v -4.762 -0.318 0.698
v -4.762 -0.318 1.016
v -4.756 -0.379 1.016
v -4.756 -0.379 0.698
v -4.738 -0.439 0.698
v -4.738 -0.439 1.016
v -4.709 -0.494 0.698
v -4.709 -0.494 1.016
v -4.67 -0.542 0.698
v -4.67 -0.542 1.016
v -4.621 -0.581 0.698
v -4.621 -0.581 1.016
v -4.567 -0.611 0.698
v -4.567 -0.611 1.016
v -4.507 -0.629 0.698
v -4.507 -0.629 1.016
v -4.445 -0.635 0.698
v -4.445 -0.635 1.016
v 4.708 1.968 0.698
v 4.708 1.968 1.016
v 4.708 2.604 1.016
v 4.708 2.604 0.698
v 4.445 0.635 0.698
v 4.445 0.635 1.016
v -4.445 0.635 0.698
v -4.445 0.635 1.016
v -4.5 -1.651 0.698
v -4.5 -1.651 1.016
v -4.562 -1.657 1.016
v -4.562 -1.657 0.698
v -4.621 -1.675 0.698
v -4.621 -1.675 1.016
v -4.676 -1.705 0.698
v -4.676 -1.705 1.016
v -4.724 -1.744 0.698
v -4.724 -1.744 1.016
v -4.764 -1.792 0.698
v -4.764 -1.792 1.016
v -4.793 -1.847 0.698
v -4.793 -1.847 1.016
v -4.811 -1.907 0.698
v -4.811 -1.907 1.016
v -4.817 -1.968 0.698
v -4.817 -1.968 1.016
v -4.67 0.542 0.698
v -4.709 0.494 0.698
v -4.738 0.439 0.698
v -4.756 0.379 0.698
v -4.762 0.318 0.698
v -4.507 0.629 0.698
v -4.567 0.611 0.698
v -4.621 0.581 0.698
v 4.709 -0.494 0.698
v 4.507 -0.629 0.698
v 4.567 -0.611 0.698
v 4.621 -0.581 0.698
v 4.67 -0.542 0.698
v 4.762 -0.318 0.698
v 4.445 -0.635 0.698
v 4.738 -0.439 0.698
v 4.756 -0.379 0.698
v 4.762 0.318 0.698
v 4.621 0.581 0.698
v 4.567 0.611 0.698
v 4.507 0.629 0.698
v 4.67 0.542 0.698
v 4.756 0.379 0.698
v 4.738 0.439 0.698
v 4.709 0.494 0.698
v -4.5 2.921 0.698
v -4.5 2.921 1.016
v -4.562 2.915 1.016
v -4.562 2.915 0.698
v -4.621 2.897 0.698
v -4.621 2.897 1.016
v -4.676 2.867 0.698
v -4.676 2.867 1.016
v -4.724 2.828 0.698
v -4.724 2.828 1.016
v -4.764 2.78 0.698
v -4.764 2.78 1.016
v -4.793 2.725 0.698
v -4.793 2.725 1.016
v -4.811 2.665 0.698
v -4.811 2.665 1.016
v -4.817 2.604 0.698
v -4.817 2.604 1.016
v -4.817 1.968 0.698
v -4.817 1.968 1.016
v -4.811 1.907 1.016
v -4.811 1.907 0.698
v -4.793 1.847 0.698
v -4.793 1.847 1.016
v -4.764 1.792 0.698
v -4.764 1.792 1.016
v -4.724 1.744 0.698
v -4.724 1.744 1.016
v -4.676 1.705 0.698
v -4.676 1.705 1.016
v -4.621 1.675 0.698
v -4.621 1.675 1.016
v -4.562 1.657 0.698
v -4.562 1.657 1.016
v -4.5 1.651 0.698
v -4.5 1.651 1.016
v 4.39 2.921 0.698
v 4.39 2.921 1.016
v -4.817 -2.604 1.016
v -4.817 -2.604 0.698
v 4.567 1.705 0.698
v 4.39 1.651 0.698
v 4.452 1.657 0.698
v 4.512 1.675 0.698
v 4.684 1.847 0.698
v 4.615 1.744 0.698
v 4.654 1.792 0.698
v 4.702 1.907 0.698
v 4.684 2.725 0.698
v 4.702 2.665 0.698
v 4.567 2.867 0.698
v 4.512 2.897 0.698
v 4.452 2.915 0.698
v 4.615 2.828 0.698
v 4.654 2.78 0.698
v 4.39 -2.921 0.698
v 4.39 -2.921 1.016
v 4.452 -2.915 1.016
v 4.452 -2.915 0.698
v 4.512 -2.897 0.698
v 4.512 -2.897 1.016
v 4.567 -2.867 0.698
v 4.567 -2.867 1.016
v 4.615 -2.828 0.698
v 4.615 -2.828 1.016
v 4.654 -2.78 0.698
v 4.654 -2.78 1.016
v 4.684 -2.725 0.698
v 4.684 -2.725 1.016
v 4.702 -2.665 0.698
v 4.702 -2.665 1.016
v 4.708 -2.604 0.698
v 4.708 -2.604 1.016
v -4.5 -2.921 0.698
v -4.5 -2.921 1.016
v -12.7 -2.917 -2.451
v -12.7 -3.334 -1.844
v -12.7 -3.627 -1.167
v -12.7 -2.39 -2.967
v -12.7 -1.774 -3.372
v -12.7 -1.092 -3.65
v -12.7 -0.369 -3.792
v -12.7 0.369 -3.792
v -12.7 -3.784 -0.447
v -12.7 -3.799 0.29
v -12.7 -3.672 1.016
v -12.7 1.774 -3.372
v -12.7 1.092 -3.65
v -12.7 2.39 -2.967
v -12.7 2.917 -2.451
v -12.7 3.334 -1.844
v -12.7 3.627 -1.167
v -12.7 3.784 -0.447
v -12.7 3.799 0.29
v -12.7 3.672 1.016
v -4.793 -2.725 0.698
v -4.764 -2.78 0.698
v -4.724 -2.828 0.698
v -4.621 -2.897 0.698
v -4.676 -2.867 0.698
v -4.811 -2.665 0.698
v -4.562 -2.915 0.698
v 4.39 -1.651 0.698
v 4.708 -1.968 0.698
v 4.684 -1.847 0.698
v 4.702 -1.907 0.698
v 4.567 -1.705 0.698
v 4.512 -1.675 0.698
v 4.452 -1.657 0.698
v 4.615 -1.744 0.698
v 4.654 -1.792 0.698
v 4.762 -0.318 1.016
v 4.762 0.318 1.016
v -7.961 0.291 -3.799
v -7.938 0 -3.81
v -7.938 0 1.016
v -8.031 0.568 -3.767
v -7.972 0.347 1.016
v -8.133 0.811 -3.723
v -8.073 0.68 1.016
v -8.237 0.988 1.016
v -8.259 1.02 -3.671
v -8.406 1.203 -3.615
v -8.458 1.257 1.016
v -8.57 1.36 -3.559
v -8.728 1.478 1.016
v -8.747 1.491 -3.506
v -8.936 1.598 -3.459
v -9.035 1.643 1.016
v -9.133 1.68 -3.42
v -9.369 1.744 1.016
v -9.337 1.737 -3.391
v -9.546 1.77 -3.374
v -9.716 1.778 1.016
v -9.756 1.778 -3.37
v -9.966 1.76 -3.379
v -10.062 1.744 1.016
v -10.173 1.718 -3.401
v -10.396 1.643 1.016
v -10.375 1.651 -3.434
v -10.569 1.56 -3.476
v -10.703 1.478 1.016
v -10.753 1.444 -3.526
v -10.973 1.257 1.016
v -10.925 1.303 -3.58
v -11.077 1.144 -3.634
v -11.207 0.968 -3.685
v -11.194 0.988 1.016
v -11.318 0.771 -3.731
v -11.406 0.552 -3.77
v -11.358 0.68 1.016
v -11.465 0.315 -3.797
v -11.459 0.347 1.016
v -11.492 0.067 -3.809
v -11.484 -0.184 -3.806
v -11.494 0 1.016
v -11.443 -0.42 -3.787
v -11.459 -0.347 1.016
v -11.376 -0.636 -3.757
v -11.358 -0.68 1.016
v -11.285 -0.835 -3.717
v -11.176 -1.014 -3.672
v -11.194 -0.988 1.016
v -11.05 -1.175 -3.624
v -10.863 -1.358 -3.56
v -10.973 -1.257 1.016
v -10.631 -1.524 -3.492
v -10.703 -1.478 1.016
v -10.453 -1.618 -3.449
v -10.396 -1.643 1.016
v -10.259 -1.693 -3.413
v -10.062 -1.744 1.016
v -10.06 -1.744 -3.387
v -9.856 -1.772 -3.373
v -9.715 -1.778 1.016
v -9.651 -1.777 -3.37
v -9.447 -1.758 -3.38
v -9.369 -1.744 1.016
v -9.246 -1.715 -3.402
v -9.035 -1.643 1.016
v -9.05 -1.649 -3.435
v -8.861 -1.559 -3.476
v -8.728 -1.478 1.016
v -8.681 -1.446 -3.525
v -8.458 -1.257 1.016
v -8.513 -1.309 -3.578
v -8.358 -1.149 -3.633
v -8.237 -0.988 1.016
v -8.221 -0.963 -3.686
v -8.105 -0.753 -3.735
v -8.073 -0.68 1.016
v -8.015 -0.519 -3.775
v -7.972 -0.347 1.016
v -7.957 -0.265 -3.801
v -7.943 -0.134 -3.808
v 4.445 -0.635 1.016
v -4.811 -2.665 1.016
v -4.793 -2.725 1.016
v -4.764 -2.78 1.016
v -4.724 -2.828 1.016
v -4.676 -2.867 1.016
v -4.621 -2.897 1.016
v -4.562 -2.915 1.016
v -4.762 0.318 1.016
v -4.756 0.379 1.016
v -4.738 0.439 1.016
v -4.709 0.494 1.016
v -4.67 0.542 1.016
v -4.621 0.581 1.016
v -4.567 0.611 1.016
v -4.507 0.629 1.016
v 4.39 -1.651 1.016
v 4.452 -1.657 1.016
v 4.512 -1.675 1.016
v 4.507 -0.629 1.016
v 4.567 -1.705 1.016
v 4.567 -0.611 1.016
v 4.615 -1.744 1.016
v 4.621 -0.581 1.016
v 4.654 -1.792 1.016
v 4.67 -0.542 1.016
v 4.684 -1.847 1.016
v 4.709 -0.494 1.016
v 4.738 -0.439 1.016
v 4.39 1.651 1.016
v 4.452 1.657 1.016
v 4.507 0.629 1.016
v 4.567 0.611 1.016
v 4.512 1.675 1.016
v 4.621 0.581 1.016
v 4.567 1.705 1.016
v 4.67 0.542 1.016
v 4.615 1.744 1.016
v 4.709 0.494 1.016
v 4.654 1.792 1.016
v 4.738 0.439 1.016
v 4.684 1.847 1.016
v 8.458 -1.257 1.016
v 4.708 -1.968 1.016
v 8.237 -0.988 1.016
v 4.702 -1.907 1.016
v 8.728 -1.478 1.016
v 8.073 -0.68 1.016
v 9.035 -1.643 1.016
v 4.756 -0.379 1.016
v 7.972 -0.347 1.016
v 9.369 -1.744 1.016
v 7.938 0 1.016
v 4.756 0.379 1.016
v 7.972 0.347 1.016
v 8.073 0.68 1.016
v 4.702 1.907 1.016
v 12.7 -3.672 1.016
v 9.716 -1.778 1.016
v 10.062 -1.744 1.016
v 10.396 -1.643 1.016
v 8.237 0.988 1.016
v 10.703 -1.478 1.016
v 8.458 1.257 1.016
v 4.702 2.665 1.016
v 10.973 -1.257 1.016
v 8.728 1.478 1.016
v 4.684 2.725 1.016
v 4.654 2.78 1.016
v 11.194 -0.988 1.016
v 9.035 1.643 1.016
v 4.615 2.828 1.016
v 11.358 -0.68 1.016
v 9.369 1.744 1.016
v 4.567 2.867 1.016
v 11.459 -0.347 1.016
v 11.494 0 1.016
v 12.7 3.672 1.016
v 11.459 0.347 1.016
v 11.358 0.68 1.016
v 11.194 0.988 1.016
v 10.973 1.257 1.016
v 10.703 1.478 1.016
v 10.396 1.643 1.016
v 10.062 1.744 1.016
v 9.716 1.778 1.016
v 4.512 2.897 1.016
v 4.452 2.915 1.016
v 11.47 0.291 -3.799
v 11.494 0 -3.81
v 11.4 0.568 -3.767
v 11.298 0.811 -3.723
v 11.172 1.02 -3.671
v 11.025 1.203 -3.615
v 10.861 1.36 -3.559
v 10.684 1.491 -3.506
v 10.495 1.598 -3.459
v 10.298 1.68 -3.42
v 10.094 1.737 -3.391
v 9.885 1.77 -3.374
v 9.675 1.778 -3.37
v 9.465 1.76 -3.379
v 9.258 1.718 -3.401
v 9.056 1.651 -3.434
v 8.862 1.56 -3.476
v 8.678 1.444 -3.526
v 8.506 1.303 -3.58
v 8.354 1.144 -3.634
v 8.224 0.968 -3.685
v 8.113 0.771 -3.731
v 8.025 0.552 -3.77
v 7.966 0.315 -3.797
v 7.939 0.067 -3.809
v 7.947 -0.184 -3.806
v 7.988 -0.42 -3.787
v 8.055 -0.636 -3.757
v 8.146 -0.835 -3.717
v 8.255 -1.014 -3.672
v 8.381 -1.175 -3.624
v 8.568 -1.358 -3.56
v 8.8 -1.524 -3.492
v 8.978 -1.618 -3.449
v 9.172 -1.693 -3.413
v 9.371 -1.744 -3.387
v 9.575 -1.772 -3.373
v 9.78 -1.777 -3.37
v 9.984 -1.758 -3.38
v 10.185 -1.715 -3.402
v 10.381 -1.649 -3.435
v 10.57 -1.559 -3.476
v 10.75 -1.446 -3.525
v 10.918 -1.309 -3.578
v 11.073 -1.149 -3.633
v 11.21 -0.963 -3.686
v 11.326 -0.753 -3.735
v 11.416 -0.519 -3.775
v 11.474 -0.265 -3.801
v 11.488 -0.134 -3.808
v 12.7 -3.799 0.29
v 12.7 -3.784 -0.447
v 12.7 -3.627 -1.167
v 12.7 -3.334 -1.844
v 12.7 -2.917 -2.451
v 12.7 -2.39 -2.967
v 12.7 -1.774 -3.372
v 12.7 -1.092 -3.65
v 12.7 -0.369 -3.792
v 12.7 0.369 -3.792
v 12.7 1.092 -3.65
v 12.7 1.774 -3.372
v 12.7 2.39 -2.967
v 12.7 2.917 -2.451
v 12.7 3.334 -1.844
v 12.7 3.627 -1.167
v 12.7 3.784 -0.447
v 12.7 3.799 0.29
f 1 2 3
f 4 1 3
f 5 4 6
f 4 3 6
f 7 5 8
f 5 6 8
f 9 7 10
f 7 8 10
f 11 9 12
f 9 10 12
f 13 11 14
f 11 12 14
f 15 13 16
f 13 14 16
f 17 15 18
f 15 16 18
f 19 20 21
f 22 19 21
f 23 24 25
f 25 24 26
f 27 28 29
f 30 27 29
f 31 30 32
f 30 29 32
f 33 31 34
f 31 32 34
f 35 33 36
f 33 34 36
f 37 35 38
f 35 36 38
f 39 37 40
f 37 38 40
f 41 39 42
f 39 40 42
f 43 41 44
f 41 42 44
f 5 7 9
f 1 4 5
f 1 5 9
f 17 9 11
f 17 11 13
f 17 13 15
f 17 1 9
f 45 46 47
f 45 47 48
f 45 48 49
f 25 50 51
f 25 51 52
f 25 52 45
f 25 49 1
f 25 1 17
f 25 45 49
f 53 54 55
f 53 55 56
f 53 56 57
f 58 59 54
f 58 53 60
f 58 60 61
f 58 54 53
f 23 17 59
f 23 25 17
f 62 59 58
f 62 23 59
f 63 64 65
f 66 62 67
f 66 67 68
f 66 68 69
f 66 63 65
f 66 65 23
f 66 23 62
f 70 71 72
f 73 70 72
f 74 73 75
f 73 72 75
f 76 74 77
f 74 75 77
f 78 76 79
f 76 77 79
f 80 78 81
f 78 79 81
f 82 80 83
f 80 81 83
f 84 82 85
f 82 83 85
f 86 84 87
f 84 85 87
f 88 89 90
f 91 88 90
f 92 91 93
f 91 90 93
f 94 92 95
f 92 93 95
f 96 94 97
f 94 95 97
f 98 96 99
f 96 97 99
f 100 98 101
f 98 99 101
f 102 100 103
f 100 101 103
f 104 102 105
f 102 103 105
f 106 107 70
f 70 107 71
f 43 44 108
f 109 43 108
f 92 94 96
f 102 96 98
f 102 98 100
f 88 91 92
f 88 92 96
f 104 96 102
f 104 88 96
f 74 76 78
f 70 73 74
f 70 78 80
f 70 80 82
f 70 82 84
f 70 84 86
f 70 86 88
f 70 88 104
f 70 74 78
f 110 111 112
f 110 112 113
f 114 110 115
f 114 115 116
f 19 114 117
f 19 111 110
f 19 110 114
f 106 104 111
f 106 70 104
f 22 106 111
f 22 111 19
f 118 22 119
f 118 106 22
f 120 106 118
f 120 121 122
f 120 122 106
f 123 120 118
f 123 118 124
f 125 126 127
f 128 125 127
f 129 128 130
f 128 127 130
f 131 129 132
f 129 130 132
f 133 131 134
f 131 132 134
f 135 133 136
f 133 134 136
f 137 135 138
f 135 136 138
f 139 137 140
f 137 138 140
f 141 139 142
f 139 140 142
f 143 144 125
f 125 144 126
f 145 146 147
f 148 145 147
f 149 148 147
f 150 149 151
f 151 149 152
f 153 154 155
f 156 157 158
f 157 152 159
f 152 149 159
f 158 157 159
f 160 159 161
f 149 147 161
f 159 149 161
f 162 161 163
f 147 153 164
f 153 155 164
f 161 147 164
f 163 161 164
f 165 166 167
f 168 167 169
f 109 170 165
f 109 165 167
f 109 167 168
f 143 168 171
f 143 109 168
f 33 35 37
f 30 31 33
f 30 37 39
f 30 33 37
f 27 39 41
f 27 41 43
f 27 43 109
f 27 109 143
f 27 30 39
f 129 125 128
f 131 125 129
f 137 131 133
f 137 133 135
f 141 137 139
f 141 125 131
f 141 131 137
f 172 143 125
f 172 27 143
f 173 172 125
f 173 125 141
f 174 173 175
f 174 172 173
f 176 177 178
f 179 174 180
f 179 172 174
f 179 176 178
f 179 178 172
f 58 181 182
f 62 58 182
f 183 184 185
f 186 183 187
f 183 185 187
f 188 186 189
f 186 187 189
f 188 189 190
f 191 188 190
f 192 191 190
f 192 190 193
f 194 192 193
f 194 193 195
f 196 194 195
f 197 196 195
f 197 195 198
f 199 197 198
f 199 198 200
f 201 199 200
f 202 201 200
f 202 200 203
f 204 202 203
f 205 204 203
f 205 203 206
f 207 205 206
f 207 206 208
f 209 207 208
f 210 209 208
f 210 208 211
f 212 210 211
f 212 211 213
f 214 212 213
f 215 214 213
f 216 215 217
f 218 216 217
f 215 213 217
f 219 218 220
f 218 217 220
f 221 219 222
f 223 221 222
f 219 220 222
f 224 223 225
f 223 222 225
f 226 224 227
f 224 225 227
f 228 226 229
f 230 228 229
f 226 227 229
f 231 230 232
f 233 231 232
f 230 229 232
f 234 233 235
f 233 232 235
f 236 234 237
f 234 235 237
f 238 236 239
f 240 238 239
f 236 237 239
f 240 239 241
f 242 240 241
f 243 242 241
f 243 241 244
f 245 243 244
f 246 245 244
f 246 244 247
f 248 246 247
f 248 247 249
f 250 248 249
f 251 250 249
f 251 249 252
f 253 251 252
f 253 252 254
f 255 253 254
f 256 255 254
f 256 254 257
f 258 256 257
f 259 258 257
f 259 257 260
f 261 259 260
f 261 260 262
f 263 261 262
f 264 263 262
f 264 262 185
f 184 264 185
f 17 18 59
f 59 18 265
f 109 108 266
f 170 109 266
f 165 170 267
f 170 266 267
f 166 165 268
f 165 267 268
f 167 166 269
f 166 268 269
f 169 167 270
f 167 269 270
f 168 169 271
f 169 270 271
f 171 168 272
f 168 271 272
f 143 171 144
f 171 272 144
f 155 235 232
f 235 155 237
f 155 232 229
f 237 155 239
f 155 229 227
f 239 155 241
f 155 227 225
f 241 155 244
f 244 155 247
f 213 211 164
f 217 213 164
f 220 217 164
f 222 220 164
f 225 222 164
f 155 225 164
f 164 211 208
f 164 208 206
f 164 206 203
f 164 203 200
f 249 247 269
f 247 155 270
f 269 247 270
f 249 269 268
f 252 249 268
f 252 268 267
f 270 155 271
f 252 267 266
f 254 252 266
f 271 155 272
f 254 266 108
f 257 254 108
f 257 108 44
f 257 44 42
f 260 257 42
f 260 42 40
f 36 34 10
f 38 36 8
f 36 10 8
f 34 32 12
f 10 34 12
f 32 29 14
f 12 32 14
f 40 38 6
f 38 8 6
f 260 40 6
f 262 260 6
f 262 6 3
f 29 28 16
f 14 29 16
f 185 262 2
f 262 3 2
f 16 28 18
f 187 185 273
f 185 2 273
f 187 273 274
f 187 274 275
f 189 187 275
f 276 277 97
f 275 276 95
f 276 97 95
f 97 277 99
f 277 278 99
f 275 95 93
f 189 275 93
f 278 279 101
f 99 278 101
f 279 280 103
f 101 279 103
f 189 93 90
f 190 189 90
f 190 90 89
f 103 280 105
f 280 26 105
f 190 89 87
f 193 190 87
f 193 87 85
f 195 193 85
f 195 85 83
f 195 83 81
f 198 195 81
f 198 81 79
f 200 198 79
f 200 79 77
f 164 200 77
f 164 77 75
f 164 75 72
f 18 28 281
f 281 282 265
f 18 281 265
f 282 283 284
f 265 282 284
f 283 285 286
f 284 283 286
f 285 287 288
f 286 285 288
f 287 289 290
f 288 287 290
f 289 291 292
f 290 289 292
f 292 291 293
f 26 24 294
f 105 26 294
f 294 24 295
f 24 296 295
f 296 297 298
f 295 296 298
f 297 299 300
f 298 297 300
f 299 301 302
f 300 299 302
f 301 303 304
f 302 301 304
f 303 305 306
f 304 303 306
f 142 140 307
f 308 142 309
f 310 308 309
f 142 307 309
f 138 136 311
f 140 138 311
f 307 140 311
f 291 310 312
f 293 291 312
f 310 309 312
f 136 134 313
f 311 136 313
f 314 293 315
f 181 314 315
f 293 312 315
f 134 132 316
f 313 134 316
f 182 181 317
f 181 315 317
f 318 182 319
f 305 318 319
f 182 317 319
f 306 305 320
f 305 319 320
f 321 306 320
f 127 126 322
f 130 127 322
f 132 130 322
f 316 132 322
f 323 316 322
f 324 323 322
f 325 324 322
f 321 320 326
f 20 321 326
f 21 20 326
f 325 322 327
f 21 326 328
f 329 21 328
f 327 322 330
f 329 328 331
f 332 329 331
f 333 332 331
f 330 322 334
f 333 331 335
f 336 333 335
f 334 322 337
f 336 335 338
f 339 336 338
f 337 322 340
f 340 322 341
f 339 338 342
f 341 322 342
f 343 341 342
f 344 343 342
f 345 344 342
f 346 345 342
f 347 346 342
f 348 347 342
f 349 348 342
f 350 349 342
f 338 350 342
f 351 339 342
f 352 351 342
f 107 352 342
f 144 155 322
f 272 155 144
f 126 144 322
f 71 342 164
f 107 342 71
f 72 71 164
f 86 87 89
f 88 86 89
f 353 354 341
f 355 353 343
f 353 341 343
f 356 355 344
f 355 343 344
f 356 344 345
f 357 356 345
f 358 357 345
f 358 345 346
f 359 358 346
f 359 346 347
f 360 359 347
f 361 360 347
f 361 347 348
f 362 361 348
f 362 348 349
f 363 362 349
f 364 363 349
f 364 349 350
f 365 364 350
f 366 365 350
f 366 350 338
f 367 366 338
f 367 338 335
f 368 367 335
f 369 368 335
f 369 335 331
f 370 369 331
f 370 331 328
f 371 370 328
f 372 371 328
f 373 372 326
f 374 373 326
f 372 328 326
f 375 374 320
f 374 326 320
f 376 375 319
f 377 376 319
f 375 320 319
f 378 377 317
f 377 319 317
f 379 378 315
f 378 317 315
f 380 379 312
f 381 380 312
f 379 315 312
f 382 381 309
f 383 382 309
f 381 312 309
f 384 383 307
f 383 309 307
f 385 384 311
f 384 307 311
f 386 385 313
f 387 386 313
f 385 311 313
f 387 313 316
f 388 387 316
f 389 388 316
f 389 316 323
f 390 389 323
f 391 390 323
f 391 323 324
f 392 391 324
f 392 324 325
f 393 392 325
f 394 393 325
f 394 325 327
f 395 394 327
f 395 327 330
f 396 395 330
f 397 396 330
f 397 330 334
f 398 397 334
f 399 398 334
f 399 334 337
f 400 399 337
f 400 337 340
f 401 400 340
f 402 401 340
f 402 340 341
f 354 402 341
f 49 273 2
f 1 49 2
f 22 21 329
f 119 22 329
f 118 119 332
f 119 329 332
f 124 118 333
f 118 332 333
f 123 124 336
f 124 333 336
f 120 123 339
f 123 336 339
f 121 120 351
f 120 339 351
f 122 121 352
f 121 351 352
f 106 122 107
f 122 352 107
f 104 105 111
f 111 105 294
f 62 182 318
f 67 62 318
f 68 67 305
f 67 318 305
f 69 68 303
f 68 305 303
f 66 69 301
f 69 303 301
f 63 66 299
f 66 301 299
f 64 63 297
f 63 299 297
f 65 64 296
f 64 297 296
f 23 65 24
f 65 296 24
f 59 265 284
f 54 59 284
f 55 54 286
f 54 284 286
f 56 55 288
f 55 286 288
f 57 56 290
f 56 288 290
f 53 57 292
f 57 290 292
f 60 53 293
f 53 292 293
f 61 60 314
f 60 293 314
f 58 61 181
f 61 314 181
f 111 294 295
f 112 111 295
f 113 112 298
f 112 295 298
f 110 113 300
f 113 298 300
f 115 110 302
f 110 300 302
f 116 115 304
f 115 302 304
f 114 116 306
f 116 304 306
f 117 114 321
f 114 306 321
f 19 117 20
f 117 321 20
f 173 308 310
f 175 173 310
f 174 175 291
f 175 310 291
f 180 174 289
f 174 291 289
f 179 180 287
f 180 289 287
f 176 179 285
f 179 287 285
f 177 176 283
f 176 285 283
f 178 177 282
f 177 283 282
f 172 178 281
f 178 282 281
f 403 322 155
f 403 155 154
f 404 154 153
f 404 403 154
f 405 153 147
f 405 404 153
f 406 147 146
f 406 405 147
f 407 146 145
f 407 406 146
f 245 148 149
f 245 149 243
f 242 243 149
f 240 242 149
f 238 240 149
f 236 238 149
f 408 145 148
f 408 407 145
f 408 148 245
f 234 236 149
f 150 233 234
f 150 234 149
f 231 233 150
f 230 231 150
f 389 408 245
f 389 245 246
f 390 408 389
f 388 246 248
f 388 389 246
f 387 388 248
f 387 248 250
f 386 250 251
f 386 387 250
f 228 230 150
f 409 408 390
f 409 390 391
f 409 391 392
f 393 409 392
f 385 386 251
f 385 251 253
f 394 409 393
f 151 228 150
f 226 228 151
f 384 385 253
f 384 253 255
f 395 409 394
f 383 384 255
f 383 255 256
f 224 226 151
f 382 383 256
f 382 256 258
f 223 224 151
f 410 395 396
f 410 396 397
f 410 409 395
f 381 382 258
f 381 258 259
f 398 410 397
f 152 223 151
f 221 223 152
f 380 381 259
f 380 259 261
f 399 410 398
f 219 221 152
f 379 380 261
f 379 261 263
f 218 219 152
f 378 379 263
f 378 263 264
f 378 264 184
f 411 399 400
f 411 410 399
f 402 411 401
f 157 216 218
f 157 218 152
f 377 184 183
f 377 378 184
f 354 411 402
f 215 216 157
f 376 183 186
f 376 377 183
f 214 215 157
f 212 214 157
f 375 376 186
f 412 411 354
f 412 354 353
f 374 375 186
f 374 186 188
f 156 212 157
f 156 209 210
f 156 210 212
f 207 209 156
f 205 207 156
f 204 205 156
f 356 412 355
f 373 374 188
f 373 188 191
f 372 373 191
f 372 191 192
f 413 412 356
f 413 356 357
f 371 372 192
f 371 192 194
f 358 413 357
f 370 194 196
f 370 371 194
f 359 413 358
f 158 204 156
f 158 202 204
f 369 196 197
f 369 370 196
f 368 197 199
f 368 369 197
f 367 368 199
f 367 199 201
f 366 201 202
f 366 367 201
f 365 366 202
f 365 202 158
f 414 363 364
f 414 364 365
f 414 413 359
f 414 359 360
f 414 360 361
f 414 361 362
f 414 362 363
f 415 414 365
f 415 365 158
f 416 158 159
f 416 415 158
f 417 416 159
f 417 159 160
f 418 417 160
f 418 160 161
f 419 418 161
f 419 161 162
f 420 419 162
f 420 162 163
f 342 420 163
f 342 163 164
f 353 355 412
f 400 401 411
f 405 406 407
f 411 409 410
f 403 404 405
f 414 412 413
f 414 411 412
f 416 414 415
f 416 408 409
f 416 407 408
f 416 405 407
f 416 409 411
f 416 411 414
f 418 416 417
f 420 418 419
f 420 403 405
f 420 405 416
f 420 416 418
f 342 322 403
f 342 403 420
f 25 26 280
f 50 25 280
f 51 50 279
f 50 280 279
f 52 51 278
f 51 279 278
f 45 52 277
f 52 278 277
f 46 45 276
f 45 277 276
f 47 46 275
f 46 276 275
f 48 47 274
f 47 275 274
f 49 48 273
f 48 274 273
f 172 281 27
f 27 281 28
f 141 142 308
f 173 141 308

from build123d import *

# Parameters (mm, degrees)
F0_R     = 3.81
F1_DEPTH = 12.7
F3_DEPTH = 25.4
F4_R     = 1.778
F5_DEPTH = 25.4
F7_DEPTH = 0.3175


with BuildPart() as f1:
    # F0 (on Right) → F1 (new body, symmetric)
    with BuildSketch(Plane.YZ):
        Circle(F0_R)
    extrude(amount=F1_DEPTH, both=True)

    # F2 (on face) → F3 (cut)
    with BuildSketch(Plane.YZ.offset(12.7)):
        with BuildLine():
            ThreePointArc((3.6720354029, 1.016), (0, 3.81), (-3.6720354029, 1.016))
            Line((-3.6720354029, 1.016), (3.6720354029, 1.016))
        make_face()
    extrude(amount=-F3_DEPTH, mode=Mode.SUBTRACT)

    # F4 (on face) → F5 (cut)
    with BuildSketch(Plane.XY.offset(1.016)):
        with Locations((-9.7155, 0)):
            Circle(F4_R)
        with Locations((9.7155, 0)):
            Circle(F4_R)
    extrude(amount=-F5_DEPTH, mode=Mode.SUBTRACT)

    # F6 (on face) → F7 (cut)
    with BuildSketch(Plane.XY.offset(1.016)):
        with BuildLine():
            Line((-4.4995615003, 1.651), (4.3904384997, 1.651))
            ThreePointArc((4.3904384997, 1.651), (4.6149449027, 1.743993597), (4.7079384997, 1.9685))
            Line((4.7079384997, 1.9685), (4.7079384997, 2.6035))
            ThreePointArc((4.7079384997, 2.6035), (4.6149449027, 2.828006403), (4.3904384997, 2.921))
            Line((4.3904384997, 2.921), (-4.4995615003, 2.921))
            ThreePointArc((-4.4995615003, 2.921), (-4.7240679033, 2.828006403), (-4.8170615003, 2.6035))
            Line((-4.8170615003, 2.6035), (-4.8170615003, 1.9685))
            ThreePointArc((-4.8170615003, 1.9685), (-4.7240679033, 1.743993597), (-4.4995615003, 1.651))
        make_face()
        with BuildLine():
            ThreePointArc((4.7625, 0.3175), (4.669506403, 0.542006403), (4.445, 0.635))
            Line((4.445, 0.635), (-4.445, 0.635))
            ThreePointArc((-4.445, 0.635), (-4.669506403, 0.542006403), (-4.7625, 0.3175))
            Line((-4.7625, 0.3175), (-4.7625, -0.3175))
            ThreePointArc((-4.7625, -0.3175), (-4.669506403, -0.542006403), (-4.445, -0.635))
            Line((-4.445, -0.635), (4.445, -0.635))
            ThreePointArc((4.445, -0.635), (4.669506403, -0.542006403), (4.7625, -0.3175))
            Line((4.7625, -0.3175), (4.7625, 0.3175))
        make_face()
        with BuildLine():
            ThreePointArc((4.7079384997, -1.9685), (4.6149449027, -1.743993597), (4.3904384997, -1.651))
            Line((4.3904384997, -1.651), (-4.4995615003, -1.651))
            ThreePointArc((-4.4995615003, -1.651), (-4.7240679033, -1.743993597), (-4.8170615003, -1.9685))
            Line((-4.8170615003, -1.9685), (-4.8170615003, -2.6035))
            ThreePointArc((-4.8170615003, -2.6035), (-4.7240679033, -2.828006403), (-4.4995615003, -2.921))
            Line((-4.4995615003, -2.921), (4.3904384997, -2.921))
            ThreePointArc((4.3904384997, -2.921), (4.6149449027, -2.828006403), (4.7079384997, -2.6035))
            Line((4.7079384997, -2.6035), (4.7079384997, -1.9685))
        make_face()
    extrude(amount=-F7_DEPTH, mode=Mode.SUBTRACT)


solid = f1.part
